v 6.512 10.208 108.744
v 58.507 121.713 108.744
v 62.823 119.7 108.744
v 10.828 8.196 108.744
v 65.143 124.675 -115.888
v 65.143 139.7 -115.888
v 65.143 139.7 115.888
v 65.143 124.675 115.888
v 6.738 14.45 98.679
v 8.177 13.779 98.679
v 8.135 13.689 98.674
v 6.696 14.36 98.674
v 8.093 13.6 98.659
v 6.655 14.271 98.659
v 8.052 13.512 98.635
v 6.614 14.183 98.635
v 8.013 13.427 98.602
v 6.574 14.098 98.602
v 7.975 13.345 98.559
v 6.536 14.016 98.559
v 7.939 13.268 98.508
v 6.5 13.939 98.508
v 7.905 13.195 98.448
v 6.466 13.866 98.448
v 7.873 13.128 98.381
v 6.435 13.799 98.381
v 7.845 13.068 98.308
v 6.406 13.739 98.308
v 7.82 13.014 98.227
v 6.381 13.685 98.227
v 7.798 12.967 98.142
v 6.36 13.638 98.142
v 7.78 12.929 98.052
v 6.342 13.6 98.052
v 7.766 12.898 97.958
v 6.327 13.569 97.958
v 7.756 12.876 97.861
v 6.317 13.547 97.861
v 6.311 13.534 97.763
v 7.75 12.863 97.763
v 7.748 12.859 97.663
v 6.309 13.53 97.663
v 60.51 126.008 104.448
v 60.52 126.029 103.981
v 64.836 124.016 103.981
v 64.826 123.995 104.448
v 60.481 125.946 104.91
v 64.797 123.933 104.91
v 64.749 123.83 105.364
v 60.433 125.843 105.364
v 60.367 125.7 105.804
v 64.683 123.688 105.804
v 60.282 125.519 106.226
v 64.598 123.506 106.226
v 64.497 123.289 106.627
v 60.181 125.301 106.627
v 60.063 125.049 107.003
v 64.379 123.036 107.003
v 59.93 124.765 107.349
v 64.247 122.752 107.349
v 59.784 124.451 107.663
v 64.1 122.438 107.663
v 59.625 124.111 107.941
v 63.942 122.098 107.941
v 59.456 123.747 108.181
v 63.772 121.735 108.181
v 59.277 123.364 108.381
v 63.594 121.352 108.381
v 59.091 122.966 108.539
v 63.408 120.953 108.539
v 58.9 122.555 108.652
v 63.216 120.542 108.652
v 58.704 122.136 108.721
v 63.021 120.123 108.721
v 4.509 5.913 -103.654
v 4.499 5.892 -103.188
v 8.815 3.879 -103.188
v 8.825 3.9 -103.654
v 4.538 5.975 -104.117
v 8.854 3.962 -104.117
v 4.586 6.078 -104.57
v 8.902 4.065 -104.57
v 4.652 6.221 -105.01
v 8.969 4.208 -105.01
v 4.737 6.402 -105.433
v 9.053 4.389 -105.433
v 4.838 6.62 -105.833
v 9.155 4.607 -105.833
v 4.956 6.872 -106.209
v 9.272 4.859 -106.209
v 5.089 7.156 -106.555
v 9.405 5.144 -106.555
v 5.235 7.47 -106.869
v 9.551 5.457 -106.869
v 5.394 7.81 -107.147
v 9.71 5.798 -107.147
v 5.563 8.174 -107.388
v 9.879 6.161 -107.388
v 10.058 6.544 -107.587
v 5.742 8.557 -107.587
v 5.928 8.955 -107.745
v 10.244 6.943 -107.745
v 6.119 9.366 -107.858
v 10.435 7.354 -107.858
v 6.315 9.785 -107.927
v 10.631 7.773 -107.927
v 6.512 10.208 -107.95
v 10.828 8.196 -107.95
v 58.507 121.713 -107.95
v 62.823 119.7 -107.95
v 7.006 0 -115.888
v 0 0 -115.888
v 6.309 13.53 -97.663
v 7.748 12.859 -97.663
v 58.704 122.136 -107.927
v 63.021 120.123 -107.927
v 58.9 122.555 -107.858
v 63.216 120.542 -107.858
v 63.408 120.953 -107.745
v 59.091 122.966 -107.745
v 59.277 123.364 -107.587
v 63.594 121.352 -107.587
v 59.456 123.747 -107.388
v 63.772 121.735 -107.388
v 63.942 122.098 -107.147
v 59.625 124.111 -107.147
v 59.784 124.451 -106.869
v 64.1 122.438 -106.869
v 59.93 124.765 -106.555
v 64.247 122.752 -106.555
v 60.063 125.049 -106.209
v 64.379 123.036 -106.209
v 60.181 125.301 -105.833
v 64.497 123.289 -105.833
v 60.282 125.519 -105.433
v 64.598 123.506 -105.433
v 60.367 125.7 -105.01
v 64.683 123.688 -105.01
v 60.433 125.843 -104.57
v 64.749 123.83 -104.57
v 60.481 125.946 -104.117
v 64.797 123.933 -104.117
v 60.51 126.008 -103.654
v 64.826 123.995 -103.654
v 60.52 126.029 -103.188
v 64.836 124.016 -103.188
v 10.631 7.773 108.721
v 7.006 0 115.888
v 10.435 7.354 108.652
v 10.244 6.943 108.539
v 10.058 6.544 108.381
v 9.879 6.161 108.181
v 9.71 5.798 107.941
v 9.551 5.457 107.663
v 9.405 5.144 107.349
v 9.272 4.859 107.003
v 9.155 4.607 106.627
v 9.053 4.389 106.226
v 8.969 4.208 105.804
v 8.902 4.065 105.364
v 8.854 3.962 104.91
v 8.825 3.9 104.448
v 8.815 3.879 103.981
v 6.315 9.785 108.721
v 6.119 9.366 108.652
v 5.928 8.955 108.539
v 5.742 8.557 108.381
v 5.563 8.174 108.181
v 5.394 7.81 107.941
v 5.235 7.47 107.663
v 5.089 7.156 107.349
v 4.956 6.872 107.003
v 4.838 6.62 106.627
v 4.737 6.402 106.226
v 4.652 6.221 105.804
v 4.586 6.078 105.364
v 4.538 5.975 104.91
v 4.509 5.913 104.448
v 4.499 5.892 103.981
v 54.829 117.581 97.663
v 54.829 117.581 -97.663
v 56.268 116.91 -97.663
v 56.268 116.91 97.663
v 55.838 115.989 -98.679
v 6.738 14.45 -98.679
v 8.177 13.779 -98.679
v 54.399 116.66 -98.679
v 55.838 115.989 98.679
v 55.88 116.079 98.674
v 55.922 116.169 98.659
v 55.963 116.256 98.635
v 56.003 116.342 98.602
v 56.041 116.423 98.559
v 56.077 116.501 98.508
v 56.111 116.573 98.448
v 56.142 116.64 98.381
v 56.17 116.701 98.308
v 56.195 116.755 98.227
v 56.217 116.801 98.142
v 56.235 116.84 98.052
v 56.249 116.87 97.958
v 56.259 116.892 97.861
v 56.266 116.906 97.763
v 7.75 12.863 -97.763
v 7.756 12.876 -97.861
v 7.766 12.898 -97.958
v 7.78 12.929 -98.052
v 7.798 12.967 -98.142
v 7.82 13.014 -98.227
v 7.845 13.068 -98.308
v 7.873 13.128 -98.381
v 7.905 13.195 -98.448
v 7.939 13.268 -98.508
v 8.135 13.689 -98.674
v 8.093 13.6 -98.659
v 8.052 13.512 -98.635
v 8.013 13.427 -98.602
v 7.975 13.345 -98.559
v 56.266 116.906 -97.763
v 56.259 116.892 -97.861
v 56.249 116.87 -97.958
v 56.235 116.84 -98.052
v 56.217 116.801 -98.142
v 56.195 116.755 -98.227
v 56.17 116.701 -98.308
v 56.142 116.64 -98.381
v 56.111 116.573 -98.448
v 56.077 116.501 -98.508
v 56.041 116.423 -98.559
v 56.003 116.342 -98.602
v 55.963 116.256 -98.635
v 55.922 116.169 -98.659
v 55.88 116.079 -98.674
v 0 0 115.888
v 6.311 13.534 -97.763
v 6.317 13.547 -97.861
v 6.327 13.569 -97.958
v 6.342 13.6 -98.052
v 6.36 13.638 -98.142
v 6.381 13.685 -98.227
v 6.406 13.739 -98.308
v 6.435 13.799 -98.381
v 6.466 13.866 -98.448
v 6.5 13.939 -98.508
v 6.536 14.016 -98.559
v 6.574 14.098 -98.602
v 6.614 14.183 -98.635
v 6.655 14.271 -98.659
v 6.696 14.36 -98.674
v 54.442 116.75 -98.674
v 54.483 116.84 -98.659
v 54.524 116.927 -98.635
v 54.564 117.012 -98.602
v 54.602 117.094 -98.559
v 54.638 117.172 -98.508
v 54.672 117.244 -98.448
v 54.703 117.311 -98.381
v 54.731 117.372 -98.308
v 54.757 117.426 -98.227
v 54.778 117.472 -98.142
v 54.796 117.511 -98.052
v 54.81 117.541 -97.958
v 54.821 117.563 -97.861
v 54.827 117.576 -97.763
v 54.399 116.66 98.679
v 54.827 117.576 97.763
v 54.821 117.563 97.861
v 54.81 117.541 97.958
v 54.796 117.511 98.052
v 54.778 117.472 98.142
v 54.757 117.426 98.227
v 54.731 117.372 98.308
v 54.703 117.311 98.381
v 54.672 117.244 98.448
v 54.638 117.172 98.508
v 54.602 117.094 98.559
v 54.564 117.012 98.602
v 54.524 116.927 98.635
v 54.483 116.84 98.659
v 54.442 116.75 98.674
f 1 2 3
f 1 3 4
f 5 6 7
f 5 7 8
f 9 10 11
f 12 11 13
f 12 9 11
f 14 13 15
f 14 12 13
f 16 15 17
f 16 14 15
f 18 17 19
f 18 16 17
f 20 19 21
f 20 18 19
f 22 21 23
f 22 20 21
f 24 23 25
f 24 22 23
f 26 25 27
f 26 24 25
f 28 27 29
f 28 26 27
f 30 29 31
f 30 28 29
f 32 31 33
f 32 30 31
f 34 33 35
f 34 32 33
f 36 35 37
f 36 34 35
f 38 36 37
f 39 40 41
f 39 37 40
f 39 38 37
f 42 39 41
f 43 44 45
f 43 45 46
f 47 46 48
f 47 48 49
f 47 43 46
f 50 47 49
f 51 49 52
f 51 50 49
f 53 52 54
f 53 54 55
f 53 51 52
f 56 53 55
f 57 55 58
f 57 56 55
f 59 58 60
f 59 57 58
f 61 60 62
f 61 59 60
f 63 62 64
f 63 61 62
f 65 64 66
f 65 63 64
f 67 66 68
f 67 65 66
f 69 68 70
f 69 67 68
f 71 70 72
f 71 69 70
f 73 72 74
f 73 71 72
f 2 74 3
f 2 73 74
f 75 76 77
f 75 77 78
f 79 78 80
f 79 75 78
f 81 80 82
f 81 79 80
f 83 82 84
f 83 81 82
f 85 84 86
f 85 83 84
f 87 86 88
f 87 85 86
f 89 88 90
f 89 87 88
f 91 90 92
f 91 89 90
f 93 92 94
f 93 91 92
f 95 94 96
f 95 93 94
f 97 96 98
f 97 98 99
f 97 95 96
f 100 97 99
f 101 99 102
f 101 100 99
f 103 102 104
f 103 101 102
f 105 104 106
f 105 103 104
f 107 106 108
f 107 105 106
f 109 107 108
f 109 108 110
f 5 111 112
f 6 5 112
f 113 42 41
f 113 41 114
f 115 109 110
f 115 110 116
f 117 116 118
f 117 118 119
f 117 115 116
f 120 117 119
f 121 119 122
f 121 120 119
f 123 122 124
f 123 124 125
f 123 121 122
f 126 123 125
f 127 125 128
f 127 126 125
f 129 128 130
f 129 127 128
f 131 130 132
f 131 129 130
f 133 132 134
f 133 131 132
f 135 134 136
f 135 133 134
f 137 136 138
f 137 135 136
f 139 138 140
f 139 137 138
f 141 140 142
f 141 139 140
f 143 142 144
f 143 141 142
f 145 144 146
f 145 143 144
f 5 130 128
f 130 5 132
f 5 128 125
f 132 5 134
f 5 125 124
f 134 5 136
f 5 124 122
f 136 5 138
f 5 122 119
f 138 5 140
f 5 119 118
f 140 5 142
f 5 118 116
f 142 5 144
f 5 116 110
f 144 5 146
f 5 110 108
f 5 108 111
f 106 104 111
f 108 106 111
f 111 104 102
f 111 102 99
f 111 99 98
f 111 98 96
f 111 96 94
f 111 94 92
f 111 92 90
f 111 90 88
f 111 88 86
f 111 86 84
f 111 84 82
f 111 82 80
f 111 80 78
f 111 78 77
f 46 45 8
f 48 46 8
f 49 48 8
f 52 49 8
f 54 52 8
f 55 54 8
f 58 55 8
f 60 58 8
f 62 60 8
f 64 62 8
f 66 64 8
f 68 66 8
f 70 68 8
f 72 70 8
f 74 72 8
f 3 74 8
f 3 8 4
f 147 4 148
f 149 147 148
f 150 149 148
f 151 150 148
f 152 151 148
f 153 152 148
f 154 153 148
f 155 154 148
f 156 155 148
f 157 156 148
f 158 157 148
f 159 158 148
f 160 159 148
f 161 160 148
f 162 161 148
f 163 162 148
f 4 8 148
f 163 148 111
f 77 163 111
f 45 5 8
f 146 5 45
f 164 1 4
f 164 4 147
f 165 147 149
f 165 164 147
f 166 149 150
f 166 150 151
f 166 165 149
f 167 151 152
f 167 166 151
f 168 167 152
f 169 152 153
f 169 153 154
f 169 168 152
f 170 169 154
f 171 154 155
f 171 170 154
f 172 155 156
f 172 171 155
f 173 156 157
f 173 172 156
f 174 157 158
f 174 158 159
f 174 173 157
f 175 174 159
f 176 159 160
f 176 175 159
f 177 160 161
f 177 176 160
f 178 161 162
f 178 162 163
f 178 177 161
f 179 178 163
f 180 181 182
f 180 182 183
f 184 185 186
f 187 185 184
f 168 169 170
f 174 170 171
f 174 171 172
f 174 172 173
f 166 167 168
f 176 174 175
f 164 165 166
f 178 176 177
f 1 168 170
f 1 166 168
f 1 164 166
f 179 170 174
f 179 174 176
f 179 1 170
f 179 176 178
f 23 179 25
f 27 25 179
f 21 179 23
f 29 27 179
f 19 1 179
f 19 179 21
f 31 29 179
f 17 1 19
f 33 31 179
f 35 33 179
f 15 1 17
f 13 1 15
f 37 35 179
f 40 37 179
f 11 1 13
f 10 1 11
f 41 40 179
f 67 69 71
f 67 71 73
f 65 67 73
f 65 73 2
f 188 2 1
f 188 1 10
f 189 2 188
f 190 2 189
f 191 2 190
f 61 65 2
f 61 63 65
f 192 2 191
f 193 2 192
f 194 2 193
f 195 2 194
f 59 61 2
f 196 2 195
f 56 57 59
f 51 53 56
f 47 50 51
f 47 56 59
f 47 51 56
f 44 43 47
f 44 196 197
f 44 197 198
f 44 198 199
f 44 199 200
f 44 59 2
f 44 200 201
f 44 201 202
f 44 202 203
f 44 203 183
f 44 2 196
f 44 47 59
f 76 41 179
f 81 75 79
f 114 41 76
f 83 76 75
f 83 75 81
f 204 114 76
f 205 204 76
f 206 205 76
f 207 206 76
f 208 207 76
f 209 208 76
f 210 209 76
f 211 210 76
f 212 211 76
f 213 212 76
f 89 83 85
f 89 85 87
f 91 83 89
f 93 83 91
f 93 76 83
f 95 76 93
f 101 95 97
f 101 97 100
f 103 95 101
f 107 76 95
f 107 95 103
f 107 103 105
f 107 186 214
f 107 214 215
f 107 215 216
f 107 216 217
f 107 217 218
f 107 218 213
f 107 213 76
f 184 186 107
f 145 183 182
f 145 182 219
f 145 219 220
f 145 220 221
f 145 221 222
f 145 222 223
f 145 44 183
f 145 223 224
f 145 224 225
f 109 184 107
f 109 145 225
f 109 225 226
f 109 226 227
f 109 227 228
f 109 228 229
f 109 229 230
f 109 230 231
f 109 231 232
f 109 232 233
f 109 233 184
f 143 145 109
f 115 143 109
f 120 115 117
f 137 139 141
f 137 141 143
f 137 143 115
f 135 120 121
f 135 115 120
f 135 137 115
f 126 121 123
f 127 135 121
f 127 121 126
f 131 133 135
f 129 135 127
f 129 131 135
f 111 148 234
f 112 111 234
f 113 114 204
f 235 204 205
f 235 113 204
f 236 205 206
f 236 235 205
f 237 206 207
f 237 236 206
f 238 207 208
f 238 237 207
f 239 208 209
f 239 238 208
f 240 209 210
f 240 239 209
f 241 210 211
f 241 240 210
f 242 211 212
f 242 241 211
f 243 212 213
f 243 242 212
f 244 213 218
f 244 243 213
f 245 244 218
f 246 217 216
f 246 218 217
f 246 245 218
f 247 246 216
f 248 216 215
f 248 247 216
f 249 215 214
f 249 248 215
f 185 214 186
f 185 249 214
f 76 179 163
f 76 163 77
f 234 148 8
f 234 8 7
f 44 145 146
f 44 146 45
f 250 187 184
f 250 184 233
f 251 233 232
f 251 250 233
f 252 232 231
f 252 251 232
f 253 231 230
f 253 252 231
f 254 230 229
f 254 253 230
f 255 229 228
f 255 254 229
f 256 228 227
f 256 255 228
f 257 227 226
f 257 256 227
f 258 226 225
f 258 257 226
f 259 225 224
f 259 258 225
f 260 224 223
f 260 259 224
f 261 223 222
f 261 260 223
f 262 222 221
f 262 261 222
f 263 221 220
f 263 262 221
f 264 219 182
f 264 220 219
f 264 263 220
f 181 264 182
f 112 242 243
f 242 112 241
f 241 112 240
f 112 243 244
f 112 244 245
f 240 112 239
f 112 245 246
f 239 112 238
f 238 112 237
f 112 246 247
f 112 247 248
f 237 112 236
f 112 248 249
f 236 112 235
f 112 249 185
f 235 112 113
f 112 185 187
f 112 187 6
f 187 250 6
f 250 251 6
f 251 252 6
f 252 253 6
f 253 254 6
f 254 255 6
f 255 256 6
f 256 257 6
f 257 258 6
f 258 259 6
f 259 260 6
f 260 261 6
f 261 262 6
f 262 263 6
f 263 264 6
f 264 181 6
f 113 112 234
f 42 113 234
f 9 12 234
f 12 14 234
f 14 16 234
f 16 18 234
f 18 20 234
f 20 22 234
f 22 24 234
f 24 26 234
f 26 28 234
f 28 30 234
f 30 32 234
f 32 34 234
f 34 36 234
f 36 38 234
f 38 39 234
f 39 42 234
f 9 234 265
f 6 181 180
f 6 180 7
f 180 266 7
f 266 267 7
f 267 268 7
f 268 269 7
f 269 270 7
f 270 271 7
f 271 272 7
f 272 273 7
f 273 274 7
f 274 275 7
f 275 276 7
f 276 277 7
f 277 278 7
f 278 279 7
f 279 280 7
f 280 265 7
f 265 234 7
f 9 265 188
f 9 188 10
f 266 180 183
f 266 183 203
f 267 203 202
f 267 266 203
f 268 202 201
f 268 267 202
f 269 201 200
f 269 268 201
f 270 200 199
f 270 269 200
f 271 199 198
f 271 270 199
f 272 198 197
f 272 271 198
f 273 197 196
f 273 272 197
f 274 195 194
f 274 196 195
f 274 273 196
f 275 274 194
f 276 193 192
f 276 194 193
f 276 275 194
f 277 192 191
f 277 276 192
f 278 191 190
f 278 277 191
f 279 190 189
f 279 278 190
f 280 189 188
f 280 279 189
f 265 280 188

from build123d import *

# Parameters (mm, degrees)
BOSS_EXTRUDE1_DEPTH = 115.8875
CUT_EXTRUDE1_REACH  = 194.846
SKETCH3_W           = 213.51875
SKETCH3_H           = 129.38125
CUT_EXTRUDE3_DEPTH  = 4.7625
FILLET1_R           = 3.175
CUT_EXTRUDE4_START  = -4.7625
CUT_EXTRUDE4_DEPTH  = 4.7625


with BuildPart() as part:
    # Sketch1 → Boss-Extrude1 (new, symmetric)
    with BuildSketch(Plane.XY):
        Polygon((0, 0), (65.143179844, 139.7), (65.143179844, 124.674619947), (7.006449785, 0), align=None)
    extrude(amount=BOSS_EXTRUDE1_DEPTH, both=True)

    # Sketch2 → Cut-Extrude1 (cut, up to next)
    with BuildSketch(Plane(origin=(0, 0, 0), x_dir=(0, 0, 1), z_dir=(-0.906307787036651, 0.42261826174069705, 0)), mode=Mode.PRIVATE) as cut_extrude1_sk1:
        with BuildLine():
            Line((-98.679, 15.944158686), (-98.679, 128.720158686))
            ThreePointArc((-98.679, 128.720158686), (-98.38142049, 129.438579176), (-97.663, 129.736158686))
            Line((-97.663, 129.736158686), (97.663, 129.736158686))
            ThreePointArc((97.663, 129.736158686), (98.38142049, 129.438579176), (98.679, 128.720158686))
            Line((98.679, 128.720158686), (98.679, 15.944158686))
            ThreePointArc((98.679, 15.944158686), (98.38142049, 15.225738197), (97.663, 14.928158686))
            Line((97.663, 14.928158686), (-97.663, 14.928158686))
            ThreePointArc((-97.663, 14.928158686), (-98.38142049, 15.225738197), (-98.679, 15.944158686))
        make_face()
    cut_extrude1_tool1 = extrude(cut_extrude1_sk1.sketch, amount=-CUT_EXTRUDE1_REACH, mode=Mode.PRIVATE) & part.part
    add(cut_extrude1_tool1.solids().sort_by_distance((30.568891, 65.555199, 0))[0], mode=Mode.SUBTRACT)

    # Sketch3 → Cut-Extrude3 (cut)
    with BuildSketch(Plane(origin=(5.755054448, -2.683625962, 0), x_dir=(0, 0, -1), z_dir=(0.906307787036651, -0.42261826174069717, 0))):
        with Locations((-0.396875, 73.519608686)):
            Rectangle(SKETCH3_W, SKETCH3_H)
    extrude(amount=-CUT_EXTRUDE3_DEPTH, mode=Mode.SUBTRACT)

    # Fillet1
    fillet1_edges = [part.edges().sort_by_distance(p)[0] for p in [
        (7.328198768, 6.32451044, 107.15625),
        (62.007077745, 123.583744812, 107.15625),
        (62.007077745, 123.583744812, -106.3625),
        (7.328198768, 6.32451044, -106.3625),
    ]]
    fillet(fillet1_edges, radius=FILLET1_R)

    # Sketch4 → Cut-Extrude4 (cut)
    with BuildSketch(Plane(origin=(5.755054448, -2.683625962, 0), x_dir=(0, 0, -1), z_dir=(0.906307787036651, -0.42261826174069717, 0)).offset(CUT_EXTRUDE4_START)):
        with BuildLine():
            Line((107.95, 12.003983686), (107.95, 135.035233686))
            ThreePointArc((107.95, 135.035233686), (106.555096045, 138.402829732), (103.1875, 139.797733686))
            Line((103.1875, 139.797733686), (-103.98125, 139.797733686))
            ThreePointArc((-103.98125, 139.797733686), (-107.348846045, 138.402829732), (-108.74375, 135.035233686))
            Line((-108.74375, 135.035233686), (-108.74375, 12.003983686))
            ThreePointArc((-108.74375, 12.003983686), (-107.348846045, 8.636387641), (-103.98125, 7.241483686))
            Line((-103.98125, 7.241483686), (103.1875, 7.241483686))
            ThreePointArc((103.1875, 7.241483686), (106.555096045, 8.636387641), (107.95, 12.003983686))
        make_face()
        with BuildLine():
            Line((-103.98125, 8.828983686), (103.1875, 8.828983686))
            ThreePointArc((103.1875, 8.828983686), (105.43256403, 9.758919656), (106.3625, 12.003983686))
            Line((106.3625, 12.003983686), (106.3625, 135.035233686))
            ThreePointArc((106.3625, 135.035233686), (105.43256403, 137.280297717), (103.1875, 138.210233686))
            Line((103.1875, 138.210233686), (-103.98125, 138.210233686))
            ThreePointArc((-103.98125, 138.210233686), (-106.22631403, 137.280297717), (-107.15625, 135.035233686))
            Line((-107.15625, 135.035233686), (-107.15625, 12.003983686))
            ThreePointArc((-107.15625, 12.003983686), (-106.22631403, 9.758919656), (-103.98125, 8.828983686))
        make_face(mode=Mode.SUBTRACT)
    extrude(amount=CUT_EXTRUDE4_DEPTH, mode=Mode.SUBTRACT)


solid = part.part
